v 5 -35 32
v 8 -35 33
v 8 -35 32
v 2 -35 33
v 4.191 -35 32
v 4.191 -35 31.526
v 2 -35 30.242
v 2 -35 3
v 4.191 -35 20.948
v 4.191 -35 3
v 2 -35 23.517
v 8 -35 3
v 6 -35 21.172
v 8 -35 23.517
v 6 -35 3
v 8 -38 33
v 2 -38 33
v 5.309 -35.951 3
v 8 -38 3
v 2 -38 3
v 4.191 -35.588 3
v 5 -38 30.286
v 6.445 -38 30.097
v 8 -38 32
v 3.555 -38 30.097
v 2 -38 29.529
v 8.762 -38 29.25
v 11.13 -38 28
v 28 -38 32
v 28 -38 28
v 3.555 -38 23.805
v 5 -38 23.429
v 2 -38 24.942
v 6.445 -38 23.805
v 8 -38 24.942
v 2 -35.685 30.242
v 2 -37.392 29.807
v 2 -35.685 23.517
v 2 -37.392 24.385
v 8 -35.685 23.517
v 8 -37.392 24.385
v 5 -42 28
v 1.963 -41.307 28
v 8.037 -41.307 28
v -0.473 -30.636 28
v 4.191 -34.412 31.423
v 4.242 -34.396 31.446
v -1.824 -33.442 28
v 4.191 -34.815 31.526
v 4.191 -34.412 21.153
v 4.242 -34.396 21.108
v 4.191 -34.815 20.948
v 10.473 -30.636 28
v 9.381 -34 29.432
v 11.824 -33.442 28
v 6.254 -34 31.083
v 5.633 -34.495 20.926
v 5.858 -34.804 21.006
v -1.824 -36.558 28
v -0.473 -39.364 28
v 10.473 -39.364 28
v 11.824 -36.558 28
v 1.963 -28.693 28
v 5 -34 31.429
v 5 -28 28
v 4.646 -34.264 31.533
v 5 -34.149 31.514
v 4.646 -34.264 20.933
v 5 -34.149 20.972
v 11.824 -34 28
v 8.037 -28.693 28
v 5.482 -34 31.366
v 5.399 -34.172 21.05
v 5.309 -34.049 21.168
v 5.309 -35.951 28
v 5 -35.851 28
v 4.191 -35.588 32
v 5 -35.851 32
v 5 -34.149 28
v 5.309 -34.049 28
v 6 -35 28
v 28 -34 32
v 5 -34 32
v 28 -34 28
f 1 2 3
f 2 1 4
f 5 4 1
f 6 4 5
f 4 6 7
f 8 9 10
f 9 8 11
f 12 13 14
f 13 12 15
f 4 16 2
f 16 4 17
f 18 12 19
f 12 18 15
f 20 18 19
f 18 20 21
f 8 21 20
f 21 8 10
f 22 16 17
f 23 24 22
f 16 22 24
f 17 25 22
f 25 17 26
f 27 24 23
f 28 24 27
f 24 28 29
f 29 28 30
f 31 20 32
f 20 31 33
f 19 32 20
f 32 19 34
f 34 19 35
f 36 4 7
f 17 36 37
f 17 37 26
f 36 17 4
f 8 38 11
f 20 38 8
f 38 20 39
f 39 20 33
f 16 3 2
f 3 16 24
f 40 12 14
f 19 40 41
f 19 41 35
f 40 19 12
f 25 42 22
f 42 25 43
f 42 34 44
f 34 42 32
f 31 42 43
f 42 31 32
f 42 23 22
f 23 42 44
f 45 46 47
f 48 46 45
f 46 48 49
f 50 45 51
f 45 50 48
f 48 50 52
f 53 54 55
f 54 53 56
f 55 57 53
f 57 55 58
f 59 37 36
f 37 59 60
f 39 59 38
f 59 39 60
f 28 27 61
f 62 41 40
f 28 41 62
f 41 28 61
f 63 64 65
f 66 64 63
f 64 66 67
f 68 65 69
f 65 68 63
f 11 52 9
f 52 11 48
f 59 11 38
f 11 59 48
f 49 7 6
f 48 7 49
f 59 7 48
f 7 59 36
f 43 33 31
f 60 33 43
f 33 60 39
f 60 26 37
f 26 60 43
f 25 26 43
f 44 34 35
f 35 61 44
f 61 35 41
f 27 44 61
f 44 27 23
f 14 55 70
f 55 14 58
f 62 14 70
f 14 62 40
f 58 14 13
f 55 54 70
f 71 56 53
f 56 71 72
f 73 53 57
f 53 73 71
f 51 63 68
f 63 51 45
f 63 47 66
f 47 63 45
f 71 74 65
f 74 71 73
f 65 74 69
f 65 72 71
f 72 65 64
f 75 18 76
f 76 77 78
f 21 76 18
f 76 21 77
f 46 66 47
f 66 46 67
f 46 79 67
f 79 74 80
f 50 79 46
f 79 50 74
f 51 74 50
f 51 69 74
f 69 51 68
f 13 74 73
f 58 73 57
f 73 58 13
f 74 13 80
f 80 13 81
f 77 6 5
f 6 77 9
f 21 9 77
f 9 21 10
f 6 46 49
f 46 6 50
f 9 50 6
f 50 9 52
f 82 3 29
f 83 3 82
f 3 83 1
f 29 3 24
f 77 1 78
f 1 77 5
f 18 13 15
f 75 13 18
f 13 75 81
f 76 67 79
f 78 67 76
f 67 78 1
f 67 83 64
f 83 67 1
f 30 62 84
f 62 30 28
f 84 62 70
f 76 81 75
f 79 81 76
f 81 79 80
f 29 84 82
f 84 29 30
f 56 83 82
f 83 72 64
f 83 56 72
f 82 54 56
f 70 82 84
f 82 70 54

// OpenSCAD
translate([59.5, -40, 2]) rotate(90) translate([2,31.5,26])
  cube(size = [4, 23, 4], center = false);

translate([5,-35,2]) {
    difference() {
	rotate(90) {
	    translate([-3,-3,1]) cube(size = [3, 6, 30]);
	    rotate_extrude($fn = 14) {
		polygon(points = [[0, 18], [0, 30], [7, 26]]);
	    }
	}
	cylinder(h = 30, r = 1);
    }
}
